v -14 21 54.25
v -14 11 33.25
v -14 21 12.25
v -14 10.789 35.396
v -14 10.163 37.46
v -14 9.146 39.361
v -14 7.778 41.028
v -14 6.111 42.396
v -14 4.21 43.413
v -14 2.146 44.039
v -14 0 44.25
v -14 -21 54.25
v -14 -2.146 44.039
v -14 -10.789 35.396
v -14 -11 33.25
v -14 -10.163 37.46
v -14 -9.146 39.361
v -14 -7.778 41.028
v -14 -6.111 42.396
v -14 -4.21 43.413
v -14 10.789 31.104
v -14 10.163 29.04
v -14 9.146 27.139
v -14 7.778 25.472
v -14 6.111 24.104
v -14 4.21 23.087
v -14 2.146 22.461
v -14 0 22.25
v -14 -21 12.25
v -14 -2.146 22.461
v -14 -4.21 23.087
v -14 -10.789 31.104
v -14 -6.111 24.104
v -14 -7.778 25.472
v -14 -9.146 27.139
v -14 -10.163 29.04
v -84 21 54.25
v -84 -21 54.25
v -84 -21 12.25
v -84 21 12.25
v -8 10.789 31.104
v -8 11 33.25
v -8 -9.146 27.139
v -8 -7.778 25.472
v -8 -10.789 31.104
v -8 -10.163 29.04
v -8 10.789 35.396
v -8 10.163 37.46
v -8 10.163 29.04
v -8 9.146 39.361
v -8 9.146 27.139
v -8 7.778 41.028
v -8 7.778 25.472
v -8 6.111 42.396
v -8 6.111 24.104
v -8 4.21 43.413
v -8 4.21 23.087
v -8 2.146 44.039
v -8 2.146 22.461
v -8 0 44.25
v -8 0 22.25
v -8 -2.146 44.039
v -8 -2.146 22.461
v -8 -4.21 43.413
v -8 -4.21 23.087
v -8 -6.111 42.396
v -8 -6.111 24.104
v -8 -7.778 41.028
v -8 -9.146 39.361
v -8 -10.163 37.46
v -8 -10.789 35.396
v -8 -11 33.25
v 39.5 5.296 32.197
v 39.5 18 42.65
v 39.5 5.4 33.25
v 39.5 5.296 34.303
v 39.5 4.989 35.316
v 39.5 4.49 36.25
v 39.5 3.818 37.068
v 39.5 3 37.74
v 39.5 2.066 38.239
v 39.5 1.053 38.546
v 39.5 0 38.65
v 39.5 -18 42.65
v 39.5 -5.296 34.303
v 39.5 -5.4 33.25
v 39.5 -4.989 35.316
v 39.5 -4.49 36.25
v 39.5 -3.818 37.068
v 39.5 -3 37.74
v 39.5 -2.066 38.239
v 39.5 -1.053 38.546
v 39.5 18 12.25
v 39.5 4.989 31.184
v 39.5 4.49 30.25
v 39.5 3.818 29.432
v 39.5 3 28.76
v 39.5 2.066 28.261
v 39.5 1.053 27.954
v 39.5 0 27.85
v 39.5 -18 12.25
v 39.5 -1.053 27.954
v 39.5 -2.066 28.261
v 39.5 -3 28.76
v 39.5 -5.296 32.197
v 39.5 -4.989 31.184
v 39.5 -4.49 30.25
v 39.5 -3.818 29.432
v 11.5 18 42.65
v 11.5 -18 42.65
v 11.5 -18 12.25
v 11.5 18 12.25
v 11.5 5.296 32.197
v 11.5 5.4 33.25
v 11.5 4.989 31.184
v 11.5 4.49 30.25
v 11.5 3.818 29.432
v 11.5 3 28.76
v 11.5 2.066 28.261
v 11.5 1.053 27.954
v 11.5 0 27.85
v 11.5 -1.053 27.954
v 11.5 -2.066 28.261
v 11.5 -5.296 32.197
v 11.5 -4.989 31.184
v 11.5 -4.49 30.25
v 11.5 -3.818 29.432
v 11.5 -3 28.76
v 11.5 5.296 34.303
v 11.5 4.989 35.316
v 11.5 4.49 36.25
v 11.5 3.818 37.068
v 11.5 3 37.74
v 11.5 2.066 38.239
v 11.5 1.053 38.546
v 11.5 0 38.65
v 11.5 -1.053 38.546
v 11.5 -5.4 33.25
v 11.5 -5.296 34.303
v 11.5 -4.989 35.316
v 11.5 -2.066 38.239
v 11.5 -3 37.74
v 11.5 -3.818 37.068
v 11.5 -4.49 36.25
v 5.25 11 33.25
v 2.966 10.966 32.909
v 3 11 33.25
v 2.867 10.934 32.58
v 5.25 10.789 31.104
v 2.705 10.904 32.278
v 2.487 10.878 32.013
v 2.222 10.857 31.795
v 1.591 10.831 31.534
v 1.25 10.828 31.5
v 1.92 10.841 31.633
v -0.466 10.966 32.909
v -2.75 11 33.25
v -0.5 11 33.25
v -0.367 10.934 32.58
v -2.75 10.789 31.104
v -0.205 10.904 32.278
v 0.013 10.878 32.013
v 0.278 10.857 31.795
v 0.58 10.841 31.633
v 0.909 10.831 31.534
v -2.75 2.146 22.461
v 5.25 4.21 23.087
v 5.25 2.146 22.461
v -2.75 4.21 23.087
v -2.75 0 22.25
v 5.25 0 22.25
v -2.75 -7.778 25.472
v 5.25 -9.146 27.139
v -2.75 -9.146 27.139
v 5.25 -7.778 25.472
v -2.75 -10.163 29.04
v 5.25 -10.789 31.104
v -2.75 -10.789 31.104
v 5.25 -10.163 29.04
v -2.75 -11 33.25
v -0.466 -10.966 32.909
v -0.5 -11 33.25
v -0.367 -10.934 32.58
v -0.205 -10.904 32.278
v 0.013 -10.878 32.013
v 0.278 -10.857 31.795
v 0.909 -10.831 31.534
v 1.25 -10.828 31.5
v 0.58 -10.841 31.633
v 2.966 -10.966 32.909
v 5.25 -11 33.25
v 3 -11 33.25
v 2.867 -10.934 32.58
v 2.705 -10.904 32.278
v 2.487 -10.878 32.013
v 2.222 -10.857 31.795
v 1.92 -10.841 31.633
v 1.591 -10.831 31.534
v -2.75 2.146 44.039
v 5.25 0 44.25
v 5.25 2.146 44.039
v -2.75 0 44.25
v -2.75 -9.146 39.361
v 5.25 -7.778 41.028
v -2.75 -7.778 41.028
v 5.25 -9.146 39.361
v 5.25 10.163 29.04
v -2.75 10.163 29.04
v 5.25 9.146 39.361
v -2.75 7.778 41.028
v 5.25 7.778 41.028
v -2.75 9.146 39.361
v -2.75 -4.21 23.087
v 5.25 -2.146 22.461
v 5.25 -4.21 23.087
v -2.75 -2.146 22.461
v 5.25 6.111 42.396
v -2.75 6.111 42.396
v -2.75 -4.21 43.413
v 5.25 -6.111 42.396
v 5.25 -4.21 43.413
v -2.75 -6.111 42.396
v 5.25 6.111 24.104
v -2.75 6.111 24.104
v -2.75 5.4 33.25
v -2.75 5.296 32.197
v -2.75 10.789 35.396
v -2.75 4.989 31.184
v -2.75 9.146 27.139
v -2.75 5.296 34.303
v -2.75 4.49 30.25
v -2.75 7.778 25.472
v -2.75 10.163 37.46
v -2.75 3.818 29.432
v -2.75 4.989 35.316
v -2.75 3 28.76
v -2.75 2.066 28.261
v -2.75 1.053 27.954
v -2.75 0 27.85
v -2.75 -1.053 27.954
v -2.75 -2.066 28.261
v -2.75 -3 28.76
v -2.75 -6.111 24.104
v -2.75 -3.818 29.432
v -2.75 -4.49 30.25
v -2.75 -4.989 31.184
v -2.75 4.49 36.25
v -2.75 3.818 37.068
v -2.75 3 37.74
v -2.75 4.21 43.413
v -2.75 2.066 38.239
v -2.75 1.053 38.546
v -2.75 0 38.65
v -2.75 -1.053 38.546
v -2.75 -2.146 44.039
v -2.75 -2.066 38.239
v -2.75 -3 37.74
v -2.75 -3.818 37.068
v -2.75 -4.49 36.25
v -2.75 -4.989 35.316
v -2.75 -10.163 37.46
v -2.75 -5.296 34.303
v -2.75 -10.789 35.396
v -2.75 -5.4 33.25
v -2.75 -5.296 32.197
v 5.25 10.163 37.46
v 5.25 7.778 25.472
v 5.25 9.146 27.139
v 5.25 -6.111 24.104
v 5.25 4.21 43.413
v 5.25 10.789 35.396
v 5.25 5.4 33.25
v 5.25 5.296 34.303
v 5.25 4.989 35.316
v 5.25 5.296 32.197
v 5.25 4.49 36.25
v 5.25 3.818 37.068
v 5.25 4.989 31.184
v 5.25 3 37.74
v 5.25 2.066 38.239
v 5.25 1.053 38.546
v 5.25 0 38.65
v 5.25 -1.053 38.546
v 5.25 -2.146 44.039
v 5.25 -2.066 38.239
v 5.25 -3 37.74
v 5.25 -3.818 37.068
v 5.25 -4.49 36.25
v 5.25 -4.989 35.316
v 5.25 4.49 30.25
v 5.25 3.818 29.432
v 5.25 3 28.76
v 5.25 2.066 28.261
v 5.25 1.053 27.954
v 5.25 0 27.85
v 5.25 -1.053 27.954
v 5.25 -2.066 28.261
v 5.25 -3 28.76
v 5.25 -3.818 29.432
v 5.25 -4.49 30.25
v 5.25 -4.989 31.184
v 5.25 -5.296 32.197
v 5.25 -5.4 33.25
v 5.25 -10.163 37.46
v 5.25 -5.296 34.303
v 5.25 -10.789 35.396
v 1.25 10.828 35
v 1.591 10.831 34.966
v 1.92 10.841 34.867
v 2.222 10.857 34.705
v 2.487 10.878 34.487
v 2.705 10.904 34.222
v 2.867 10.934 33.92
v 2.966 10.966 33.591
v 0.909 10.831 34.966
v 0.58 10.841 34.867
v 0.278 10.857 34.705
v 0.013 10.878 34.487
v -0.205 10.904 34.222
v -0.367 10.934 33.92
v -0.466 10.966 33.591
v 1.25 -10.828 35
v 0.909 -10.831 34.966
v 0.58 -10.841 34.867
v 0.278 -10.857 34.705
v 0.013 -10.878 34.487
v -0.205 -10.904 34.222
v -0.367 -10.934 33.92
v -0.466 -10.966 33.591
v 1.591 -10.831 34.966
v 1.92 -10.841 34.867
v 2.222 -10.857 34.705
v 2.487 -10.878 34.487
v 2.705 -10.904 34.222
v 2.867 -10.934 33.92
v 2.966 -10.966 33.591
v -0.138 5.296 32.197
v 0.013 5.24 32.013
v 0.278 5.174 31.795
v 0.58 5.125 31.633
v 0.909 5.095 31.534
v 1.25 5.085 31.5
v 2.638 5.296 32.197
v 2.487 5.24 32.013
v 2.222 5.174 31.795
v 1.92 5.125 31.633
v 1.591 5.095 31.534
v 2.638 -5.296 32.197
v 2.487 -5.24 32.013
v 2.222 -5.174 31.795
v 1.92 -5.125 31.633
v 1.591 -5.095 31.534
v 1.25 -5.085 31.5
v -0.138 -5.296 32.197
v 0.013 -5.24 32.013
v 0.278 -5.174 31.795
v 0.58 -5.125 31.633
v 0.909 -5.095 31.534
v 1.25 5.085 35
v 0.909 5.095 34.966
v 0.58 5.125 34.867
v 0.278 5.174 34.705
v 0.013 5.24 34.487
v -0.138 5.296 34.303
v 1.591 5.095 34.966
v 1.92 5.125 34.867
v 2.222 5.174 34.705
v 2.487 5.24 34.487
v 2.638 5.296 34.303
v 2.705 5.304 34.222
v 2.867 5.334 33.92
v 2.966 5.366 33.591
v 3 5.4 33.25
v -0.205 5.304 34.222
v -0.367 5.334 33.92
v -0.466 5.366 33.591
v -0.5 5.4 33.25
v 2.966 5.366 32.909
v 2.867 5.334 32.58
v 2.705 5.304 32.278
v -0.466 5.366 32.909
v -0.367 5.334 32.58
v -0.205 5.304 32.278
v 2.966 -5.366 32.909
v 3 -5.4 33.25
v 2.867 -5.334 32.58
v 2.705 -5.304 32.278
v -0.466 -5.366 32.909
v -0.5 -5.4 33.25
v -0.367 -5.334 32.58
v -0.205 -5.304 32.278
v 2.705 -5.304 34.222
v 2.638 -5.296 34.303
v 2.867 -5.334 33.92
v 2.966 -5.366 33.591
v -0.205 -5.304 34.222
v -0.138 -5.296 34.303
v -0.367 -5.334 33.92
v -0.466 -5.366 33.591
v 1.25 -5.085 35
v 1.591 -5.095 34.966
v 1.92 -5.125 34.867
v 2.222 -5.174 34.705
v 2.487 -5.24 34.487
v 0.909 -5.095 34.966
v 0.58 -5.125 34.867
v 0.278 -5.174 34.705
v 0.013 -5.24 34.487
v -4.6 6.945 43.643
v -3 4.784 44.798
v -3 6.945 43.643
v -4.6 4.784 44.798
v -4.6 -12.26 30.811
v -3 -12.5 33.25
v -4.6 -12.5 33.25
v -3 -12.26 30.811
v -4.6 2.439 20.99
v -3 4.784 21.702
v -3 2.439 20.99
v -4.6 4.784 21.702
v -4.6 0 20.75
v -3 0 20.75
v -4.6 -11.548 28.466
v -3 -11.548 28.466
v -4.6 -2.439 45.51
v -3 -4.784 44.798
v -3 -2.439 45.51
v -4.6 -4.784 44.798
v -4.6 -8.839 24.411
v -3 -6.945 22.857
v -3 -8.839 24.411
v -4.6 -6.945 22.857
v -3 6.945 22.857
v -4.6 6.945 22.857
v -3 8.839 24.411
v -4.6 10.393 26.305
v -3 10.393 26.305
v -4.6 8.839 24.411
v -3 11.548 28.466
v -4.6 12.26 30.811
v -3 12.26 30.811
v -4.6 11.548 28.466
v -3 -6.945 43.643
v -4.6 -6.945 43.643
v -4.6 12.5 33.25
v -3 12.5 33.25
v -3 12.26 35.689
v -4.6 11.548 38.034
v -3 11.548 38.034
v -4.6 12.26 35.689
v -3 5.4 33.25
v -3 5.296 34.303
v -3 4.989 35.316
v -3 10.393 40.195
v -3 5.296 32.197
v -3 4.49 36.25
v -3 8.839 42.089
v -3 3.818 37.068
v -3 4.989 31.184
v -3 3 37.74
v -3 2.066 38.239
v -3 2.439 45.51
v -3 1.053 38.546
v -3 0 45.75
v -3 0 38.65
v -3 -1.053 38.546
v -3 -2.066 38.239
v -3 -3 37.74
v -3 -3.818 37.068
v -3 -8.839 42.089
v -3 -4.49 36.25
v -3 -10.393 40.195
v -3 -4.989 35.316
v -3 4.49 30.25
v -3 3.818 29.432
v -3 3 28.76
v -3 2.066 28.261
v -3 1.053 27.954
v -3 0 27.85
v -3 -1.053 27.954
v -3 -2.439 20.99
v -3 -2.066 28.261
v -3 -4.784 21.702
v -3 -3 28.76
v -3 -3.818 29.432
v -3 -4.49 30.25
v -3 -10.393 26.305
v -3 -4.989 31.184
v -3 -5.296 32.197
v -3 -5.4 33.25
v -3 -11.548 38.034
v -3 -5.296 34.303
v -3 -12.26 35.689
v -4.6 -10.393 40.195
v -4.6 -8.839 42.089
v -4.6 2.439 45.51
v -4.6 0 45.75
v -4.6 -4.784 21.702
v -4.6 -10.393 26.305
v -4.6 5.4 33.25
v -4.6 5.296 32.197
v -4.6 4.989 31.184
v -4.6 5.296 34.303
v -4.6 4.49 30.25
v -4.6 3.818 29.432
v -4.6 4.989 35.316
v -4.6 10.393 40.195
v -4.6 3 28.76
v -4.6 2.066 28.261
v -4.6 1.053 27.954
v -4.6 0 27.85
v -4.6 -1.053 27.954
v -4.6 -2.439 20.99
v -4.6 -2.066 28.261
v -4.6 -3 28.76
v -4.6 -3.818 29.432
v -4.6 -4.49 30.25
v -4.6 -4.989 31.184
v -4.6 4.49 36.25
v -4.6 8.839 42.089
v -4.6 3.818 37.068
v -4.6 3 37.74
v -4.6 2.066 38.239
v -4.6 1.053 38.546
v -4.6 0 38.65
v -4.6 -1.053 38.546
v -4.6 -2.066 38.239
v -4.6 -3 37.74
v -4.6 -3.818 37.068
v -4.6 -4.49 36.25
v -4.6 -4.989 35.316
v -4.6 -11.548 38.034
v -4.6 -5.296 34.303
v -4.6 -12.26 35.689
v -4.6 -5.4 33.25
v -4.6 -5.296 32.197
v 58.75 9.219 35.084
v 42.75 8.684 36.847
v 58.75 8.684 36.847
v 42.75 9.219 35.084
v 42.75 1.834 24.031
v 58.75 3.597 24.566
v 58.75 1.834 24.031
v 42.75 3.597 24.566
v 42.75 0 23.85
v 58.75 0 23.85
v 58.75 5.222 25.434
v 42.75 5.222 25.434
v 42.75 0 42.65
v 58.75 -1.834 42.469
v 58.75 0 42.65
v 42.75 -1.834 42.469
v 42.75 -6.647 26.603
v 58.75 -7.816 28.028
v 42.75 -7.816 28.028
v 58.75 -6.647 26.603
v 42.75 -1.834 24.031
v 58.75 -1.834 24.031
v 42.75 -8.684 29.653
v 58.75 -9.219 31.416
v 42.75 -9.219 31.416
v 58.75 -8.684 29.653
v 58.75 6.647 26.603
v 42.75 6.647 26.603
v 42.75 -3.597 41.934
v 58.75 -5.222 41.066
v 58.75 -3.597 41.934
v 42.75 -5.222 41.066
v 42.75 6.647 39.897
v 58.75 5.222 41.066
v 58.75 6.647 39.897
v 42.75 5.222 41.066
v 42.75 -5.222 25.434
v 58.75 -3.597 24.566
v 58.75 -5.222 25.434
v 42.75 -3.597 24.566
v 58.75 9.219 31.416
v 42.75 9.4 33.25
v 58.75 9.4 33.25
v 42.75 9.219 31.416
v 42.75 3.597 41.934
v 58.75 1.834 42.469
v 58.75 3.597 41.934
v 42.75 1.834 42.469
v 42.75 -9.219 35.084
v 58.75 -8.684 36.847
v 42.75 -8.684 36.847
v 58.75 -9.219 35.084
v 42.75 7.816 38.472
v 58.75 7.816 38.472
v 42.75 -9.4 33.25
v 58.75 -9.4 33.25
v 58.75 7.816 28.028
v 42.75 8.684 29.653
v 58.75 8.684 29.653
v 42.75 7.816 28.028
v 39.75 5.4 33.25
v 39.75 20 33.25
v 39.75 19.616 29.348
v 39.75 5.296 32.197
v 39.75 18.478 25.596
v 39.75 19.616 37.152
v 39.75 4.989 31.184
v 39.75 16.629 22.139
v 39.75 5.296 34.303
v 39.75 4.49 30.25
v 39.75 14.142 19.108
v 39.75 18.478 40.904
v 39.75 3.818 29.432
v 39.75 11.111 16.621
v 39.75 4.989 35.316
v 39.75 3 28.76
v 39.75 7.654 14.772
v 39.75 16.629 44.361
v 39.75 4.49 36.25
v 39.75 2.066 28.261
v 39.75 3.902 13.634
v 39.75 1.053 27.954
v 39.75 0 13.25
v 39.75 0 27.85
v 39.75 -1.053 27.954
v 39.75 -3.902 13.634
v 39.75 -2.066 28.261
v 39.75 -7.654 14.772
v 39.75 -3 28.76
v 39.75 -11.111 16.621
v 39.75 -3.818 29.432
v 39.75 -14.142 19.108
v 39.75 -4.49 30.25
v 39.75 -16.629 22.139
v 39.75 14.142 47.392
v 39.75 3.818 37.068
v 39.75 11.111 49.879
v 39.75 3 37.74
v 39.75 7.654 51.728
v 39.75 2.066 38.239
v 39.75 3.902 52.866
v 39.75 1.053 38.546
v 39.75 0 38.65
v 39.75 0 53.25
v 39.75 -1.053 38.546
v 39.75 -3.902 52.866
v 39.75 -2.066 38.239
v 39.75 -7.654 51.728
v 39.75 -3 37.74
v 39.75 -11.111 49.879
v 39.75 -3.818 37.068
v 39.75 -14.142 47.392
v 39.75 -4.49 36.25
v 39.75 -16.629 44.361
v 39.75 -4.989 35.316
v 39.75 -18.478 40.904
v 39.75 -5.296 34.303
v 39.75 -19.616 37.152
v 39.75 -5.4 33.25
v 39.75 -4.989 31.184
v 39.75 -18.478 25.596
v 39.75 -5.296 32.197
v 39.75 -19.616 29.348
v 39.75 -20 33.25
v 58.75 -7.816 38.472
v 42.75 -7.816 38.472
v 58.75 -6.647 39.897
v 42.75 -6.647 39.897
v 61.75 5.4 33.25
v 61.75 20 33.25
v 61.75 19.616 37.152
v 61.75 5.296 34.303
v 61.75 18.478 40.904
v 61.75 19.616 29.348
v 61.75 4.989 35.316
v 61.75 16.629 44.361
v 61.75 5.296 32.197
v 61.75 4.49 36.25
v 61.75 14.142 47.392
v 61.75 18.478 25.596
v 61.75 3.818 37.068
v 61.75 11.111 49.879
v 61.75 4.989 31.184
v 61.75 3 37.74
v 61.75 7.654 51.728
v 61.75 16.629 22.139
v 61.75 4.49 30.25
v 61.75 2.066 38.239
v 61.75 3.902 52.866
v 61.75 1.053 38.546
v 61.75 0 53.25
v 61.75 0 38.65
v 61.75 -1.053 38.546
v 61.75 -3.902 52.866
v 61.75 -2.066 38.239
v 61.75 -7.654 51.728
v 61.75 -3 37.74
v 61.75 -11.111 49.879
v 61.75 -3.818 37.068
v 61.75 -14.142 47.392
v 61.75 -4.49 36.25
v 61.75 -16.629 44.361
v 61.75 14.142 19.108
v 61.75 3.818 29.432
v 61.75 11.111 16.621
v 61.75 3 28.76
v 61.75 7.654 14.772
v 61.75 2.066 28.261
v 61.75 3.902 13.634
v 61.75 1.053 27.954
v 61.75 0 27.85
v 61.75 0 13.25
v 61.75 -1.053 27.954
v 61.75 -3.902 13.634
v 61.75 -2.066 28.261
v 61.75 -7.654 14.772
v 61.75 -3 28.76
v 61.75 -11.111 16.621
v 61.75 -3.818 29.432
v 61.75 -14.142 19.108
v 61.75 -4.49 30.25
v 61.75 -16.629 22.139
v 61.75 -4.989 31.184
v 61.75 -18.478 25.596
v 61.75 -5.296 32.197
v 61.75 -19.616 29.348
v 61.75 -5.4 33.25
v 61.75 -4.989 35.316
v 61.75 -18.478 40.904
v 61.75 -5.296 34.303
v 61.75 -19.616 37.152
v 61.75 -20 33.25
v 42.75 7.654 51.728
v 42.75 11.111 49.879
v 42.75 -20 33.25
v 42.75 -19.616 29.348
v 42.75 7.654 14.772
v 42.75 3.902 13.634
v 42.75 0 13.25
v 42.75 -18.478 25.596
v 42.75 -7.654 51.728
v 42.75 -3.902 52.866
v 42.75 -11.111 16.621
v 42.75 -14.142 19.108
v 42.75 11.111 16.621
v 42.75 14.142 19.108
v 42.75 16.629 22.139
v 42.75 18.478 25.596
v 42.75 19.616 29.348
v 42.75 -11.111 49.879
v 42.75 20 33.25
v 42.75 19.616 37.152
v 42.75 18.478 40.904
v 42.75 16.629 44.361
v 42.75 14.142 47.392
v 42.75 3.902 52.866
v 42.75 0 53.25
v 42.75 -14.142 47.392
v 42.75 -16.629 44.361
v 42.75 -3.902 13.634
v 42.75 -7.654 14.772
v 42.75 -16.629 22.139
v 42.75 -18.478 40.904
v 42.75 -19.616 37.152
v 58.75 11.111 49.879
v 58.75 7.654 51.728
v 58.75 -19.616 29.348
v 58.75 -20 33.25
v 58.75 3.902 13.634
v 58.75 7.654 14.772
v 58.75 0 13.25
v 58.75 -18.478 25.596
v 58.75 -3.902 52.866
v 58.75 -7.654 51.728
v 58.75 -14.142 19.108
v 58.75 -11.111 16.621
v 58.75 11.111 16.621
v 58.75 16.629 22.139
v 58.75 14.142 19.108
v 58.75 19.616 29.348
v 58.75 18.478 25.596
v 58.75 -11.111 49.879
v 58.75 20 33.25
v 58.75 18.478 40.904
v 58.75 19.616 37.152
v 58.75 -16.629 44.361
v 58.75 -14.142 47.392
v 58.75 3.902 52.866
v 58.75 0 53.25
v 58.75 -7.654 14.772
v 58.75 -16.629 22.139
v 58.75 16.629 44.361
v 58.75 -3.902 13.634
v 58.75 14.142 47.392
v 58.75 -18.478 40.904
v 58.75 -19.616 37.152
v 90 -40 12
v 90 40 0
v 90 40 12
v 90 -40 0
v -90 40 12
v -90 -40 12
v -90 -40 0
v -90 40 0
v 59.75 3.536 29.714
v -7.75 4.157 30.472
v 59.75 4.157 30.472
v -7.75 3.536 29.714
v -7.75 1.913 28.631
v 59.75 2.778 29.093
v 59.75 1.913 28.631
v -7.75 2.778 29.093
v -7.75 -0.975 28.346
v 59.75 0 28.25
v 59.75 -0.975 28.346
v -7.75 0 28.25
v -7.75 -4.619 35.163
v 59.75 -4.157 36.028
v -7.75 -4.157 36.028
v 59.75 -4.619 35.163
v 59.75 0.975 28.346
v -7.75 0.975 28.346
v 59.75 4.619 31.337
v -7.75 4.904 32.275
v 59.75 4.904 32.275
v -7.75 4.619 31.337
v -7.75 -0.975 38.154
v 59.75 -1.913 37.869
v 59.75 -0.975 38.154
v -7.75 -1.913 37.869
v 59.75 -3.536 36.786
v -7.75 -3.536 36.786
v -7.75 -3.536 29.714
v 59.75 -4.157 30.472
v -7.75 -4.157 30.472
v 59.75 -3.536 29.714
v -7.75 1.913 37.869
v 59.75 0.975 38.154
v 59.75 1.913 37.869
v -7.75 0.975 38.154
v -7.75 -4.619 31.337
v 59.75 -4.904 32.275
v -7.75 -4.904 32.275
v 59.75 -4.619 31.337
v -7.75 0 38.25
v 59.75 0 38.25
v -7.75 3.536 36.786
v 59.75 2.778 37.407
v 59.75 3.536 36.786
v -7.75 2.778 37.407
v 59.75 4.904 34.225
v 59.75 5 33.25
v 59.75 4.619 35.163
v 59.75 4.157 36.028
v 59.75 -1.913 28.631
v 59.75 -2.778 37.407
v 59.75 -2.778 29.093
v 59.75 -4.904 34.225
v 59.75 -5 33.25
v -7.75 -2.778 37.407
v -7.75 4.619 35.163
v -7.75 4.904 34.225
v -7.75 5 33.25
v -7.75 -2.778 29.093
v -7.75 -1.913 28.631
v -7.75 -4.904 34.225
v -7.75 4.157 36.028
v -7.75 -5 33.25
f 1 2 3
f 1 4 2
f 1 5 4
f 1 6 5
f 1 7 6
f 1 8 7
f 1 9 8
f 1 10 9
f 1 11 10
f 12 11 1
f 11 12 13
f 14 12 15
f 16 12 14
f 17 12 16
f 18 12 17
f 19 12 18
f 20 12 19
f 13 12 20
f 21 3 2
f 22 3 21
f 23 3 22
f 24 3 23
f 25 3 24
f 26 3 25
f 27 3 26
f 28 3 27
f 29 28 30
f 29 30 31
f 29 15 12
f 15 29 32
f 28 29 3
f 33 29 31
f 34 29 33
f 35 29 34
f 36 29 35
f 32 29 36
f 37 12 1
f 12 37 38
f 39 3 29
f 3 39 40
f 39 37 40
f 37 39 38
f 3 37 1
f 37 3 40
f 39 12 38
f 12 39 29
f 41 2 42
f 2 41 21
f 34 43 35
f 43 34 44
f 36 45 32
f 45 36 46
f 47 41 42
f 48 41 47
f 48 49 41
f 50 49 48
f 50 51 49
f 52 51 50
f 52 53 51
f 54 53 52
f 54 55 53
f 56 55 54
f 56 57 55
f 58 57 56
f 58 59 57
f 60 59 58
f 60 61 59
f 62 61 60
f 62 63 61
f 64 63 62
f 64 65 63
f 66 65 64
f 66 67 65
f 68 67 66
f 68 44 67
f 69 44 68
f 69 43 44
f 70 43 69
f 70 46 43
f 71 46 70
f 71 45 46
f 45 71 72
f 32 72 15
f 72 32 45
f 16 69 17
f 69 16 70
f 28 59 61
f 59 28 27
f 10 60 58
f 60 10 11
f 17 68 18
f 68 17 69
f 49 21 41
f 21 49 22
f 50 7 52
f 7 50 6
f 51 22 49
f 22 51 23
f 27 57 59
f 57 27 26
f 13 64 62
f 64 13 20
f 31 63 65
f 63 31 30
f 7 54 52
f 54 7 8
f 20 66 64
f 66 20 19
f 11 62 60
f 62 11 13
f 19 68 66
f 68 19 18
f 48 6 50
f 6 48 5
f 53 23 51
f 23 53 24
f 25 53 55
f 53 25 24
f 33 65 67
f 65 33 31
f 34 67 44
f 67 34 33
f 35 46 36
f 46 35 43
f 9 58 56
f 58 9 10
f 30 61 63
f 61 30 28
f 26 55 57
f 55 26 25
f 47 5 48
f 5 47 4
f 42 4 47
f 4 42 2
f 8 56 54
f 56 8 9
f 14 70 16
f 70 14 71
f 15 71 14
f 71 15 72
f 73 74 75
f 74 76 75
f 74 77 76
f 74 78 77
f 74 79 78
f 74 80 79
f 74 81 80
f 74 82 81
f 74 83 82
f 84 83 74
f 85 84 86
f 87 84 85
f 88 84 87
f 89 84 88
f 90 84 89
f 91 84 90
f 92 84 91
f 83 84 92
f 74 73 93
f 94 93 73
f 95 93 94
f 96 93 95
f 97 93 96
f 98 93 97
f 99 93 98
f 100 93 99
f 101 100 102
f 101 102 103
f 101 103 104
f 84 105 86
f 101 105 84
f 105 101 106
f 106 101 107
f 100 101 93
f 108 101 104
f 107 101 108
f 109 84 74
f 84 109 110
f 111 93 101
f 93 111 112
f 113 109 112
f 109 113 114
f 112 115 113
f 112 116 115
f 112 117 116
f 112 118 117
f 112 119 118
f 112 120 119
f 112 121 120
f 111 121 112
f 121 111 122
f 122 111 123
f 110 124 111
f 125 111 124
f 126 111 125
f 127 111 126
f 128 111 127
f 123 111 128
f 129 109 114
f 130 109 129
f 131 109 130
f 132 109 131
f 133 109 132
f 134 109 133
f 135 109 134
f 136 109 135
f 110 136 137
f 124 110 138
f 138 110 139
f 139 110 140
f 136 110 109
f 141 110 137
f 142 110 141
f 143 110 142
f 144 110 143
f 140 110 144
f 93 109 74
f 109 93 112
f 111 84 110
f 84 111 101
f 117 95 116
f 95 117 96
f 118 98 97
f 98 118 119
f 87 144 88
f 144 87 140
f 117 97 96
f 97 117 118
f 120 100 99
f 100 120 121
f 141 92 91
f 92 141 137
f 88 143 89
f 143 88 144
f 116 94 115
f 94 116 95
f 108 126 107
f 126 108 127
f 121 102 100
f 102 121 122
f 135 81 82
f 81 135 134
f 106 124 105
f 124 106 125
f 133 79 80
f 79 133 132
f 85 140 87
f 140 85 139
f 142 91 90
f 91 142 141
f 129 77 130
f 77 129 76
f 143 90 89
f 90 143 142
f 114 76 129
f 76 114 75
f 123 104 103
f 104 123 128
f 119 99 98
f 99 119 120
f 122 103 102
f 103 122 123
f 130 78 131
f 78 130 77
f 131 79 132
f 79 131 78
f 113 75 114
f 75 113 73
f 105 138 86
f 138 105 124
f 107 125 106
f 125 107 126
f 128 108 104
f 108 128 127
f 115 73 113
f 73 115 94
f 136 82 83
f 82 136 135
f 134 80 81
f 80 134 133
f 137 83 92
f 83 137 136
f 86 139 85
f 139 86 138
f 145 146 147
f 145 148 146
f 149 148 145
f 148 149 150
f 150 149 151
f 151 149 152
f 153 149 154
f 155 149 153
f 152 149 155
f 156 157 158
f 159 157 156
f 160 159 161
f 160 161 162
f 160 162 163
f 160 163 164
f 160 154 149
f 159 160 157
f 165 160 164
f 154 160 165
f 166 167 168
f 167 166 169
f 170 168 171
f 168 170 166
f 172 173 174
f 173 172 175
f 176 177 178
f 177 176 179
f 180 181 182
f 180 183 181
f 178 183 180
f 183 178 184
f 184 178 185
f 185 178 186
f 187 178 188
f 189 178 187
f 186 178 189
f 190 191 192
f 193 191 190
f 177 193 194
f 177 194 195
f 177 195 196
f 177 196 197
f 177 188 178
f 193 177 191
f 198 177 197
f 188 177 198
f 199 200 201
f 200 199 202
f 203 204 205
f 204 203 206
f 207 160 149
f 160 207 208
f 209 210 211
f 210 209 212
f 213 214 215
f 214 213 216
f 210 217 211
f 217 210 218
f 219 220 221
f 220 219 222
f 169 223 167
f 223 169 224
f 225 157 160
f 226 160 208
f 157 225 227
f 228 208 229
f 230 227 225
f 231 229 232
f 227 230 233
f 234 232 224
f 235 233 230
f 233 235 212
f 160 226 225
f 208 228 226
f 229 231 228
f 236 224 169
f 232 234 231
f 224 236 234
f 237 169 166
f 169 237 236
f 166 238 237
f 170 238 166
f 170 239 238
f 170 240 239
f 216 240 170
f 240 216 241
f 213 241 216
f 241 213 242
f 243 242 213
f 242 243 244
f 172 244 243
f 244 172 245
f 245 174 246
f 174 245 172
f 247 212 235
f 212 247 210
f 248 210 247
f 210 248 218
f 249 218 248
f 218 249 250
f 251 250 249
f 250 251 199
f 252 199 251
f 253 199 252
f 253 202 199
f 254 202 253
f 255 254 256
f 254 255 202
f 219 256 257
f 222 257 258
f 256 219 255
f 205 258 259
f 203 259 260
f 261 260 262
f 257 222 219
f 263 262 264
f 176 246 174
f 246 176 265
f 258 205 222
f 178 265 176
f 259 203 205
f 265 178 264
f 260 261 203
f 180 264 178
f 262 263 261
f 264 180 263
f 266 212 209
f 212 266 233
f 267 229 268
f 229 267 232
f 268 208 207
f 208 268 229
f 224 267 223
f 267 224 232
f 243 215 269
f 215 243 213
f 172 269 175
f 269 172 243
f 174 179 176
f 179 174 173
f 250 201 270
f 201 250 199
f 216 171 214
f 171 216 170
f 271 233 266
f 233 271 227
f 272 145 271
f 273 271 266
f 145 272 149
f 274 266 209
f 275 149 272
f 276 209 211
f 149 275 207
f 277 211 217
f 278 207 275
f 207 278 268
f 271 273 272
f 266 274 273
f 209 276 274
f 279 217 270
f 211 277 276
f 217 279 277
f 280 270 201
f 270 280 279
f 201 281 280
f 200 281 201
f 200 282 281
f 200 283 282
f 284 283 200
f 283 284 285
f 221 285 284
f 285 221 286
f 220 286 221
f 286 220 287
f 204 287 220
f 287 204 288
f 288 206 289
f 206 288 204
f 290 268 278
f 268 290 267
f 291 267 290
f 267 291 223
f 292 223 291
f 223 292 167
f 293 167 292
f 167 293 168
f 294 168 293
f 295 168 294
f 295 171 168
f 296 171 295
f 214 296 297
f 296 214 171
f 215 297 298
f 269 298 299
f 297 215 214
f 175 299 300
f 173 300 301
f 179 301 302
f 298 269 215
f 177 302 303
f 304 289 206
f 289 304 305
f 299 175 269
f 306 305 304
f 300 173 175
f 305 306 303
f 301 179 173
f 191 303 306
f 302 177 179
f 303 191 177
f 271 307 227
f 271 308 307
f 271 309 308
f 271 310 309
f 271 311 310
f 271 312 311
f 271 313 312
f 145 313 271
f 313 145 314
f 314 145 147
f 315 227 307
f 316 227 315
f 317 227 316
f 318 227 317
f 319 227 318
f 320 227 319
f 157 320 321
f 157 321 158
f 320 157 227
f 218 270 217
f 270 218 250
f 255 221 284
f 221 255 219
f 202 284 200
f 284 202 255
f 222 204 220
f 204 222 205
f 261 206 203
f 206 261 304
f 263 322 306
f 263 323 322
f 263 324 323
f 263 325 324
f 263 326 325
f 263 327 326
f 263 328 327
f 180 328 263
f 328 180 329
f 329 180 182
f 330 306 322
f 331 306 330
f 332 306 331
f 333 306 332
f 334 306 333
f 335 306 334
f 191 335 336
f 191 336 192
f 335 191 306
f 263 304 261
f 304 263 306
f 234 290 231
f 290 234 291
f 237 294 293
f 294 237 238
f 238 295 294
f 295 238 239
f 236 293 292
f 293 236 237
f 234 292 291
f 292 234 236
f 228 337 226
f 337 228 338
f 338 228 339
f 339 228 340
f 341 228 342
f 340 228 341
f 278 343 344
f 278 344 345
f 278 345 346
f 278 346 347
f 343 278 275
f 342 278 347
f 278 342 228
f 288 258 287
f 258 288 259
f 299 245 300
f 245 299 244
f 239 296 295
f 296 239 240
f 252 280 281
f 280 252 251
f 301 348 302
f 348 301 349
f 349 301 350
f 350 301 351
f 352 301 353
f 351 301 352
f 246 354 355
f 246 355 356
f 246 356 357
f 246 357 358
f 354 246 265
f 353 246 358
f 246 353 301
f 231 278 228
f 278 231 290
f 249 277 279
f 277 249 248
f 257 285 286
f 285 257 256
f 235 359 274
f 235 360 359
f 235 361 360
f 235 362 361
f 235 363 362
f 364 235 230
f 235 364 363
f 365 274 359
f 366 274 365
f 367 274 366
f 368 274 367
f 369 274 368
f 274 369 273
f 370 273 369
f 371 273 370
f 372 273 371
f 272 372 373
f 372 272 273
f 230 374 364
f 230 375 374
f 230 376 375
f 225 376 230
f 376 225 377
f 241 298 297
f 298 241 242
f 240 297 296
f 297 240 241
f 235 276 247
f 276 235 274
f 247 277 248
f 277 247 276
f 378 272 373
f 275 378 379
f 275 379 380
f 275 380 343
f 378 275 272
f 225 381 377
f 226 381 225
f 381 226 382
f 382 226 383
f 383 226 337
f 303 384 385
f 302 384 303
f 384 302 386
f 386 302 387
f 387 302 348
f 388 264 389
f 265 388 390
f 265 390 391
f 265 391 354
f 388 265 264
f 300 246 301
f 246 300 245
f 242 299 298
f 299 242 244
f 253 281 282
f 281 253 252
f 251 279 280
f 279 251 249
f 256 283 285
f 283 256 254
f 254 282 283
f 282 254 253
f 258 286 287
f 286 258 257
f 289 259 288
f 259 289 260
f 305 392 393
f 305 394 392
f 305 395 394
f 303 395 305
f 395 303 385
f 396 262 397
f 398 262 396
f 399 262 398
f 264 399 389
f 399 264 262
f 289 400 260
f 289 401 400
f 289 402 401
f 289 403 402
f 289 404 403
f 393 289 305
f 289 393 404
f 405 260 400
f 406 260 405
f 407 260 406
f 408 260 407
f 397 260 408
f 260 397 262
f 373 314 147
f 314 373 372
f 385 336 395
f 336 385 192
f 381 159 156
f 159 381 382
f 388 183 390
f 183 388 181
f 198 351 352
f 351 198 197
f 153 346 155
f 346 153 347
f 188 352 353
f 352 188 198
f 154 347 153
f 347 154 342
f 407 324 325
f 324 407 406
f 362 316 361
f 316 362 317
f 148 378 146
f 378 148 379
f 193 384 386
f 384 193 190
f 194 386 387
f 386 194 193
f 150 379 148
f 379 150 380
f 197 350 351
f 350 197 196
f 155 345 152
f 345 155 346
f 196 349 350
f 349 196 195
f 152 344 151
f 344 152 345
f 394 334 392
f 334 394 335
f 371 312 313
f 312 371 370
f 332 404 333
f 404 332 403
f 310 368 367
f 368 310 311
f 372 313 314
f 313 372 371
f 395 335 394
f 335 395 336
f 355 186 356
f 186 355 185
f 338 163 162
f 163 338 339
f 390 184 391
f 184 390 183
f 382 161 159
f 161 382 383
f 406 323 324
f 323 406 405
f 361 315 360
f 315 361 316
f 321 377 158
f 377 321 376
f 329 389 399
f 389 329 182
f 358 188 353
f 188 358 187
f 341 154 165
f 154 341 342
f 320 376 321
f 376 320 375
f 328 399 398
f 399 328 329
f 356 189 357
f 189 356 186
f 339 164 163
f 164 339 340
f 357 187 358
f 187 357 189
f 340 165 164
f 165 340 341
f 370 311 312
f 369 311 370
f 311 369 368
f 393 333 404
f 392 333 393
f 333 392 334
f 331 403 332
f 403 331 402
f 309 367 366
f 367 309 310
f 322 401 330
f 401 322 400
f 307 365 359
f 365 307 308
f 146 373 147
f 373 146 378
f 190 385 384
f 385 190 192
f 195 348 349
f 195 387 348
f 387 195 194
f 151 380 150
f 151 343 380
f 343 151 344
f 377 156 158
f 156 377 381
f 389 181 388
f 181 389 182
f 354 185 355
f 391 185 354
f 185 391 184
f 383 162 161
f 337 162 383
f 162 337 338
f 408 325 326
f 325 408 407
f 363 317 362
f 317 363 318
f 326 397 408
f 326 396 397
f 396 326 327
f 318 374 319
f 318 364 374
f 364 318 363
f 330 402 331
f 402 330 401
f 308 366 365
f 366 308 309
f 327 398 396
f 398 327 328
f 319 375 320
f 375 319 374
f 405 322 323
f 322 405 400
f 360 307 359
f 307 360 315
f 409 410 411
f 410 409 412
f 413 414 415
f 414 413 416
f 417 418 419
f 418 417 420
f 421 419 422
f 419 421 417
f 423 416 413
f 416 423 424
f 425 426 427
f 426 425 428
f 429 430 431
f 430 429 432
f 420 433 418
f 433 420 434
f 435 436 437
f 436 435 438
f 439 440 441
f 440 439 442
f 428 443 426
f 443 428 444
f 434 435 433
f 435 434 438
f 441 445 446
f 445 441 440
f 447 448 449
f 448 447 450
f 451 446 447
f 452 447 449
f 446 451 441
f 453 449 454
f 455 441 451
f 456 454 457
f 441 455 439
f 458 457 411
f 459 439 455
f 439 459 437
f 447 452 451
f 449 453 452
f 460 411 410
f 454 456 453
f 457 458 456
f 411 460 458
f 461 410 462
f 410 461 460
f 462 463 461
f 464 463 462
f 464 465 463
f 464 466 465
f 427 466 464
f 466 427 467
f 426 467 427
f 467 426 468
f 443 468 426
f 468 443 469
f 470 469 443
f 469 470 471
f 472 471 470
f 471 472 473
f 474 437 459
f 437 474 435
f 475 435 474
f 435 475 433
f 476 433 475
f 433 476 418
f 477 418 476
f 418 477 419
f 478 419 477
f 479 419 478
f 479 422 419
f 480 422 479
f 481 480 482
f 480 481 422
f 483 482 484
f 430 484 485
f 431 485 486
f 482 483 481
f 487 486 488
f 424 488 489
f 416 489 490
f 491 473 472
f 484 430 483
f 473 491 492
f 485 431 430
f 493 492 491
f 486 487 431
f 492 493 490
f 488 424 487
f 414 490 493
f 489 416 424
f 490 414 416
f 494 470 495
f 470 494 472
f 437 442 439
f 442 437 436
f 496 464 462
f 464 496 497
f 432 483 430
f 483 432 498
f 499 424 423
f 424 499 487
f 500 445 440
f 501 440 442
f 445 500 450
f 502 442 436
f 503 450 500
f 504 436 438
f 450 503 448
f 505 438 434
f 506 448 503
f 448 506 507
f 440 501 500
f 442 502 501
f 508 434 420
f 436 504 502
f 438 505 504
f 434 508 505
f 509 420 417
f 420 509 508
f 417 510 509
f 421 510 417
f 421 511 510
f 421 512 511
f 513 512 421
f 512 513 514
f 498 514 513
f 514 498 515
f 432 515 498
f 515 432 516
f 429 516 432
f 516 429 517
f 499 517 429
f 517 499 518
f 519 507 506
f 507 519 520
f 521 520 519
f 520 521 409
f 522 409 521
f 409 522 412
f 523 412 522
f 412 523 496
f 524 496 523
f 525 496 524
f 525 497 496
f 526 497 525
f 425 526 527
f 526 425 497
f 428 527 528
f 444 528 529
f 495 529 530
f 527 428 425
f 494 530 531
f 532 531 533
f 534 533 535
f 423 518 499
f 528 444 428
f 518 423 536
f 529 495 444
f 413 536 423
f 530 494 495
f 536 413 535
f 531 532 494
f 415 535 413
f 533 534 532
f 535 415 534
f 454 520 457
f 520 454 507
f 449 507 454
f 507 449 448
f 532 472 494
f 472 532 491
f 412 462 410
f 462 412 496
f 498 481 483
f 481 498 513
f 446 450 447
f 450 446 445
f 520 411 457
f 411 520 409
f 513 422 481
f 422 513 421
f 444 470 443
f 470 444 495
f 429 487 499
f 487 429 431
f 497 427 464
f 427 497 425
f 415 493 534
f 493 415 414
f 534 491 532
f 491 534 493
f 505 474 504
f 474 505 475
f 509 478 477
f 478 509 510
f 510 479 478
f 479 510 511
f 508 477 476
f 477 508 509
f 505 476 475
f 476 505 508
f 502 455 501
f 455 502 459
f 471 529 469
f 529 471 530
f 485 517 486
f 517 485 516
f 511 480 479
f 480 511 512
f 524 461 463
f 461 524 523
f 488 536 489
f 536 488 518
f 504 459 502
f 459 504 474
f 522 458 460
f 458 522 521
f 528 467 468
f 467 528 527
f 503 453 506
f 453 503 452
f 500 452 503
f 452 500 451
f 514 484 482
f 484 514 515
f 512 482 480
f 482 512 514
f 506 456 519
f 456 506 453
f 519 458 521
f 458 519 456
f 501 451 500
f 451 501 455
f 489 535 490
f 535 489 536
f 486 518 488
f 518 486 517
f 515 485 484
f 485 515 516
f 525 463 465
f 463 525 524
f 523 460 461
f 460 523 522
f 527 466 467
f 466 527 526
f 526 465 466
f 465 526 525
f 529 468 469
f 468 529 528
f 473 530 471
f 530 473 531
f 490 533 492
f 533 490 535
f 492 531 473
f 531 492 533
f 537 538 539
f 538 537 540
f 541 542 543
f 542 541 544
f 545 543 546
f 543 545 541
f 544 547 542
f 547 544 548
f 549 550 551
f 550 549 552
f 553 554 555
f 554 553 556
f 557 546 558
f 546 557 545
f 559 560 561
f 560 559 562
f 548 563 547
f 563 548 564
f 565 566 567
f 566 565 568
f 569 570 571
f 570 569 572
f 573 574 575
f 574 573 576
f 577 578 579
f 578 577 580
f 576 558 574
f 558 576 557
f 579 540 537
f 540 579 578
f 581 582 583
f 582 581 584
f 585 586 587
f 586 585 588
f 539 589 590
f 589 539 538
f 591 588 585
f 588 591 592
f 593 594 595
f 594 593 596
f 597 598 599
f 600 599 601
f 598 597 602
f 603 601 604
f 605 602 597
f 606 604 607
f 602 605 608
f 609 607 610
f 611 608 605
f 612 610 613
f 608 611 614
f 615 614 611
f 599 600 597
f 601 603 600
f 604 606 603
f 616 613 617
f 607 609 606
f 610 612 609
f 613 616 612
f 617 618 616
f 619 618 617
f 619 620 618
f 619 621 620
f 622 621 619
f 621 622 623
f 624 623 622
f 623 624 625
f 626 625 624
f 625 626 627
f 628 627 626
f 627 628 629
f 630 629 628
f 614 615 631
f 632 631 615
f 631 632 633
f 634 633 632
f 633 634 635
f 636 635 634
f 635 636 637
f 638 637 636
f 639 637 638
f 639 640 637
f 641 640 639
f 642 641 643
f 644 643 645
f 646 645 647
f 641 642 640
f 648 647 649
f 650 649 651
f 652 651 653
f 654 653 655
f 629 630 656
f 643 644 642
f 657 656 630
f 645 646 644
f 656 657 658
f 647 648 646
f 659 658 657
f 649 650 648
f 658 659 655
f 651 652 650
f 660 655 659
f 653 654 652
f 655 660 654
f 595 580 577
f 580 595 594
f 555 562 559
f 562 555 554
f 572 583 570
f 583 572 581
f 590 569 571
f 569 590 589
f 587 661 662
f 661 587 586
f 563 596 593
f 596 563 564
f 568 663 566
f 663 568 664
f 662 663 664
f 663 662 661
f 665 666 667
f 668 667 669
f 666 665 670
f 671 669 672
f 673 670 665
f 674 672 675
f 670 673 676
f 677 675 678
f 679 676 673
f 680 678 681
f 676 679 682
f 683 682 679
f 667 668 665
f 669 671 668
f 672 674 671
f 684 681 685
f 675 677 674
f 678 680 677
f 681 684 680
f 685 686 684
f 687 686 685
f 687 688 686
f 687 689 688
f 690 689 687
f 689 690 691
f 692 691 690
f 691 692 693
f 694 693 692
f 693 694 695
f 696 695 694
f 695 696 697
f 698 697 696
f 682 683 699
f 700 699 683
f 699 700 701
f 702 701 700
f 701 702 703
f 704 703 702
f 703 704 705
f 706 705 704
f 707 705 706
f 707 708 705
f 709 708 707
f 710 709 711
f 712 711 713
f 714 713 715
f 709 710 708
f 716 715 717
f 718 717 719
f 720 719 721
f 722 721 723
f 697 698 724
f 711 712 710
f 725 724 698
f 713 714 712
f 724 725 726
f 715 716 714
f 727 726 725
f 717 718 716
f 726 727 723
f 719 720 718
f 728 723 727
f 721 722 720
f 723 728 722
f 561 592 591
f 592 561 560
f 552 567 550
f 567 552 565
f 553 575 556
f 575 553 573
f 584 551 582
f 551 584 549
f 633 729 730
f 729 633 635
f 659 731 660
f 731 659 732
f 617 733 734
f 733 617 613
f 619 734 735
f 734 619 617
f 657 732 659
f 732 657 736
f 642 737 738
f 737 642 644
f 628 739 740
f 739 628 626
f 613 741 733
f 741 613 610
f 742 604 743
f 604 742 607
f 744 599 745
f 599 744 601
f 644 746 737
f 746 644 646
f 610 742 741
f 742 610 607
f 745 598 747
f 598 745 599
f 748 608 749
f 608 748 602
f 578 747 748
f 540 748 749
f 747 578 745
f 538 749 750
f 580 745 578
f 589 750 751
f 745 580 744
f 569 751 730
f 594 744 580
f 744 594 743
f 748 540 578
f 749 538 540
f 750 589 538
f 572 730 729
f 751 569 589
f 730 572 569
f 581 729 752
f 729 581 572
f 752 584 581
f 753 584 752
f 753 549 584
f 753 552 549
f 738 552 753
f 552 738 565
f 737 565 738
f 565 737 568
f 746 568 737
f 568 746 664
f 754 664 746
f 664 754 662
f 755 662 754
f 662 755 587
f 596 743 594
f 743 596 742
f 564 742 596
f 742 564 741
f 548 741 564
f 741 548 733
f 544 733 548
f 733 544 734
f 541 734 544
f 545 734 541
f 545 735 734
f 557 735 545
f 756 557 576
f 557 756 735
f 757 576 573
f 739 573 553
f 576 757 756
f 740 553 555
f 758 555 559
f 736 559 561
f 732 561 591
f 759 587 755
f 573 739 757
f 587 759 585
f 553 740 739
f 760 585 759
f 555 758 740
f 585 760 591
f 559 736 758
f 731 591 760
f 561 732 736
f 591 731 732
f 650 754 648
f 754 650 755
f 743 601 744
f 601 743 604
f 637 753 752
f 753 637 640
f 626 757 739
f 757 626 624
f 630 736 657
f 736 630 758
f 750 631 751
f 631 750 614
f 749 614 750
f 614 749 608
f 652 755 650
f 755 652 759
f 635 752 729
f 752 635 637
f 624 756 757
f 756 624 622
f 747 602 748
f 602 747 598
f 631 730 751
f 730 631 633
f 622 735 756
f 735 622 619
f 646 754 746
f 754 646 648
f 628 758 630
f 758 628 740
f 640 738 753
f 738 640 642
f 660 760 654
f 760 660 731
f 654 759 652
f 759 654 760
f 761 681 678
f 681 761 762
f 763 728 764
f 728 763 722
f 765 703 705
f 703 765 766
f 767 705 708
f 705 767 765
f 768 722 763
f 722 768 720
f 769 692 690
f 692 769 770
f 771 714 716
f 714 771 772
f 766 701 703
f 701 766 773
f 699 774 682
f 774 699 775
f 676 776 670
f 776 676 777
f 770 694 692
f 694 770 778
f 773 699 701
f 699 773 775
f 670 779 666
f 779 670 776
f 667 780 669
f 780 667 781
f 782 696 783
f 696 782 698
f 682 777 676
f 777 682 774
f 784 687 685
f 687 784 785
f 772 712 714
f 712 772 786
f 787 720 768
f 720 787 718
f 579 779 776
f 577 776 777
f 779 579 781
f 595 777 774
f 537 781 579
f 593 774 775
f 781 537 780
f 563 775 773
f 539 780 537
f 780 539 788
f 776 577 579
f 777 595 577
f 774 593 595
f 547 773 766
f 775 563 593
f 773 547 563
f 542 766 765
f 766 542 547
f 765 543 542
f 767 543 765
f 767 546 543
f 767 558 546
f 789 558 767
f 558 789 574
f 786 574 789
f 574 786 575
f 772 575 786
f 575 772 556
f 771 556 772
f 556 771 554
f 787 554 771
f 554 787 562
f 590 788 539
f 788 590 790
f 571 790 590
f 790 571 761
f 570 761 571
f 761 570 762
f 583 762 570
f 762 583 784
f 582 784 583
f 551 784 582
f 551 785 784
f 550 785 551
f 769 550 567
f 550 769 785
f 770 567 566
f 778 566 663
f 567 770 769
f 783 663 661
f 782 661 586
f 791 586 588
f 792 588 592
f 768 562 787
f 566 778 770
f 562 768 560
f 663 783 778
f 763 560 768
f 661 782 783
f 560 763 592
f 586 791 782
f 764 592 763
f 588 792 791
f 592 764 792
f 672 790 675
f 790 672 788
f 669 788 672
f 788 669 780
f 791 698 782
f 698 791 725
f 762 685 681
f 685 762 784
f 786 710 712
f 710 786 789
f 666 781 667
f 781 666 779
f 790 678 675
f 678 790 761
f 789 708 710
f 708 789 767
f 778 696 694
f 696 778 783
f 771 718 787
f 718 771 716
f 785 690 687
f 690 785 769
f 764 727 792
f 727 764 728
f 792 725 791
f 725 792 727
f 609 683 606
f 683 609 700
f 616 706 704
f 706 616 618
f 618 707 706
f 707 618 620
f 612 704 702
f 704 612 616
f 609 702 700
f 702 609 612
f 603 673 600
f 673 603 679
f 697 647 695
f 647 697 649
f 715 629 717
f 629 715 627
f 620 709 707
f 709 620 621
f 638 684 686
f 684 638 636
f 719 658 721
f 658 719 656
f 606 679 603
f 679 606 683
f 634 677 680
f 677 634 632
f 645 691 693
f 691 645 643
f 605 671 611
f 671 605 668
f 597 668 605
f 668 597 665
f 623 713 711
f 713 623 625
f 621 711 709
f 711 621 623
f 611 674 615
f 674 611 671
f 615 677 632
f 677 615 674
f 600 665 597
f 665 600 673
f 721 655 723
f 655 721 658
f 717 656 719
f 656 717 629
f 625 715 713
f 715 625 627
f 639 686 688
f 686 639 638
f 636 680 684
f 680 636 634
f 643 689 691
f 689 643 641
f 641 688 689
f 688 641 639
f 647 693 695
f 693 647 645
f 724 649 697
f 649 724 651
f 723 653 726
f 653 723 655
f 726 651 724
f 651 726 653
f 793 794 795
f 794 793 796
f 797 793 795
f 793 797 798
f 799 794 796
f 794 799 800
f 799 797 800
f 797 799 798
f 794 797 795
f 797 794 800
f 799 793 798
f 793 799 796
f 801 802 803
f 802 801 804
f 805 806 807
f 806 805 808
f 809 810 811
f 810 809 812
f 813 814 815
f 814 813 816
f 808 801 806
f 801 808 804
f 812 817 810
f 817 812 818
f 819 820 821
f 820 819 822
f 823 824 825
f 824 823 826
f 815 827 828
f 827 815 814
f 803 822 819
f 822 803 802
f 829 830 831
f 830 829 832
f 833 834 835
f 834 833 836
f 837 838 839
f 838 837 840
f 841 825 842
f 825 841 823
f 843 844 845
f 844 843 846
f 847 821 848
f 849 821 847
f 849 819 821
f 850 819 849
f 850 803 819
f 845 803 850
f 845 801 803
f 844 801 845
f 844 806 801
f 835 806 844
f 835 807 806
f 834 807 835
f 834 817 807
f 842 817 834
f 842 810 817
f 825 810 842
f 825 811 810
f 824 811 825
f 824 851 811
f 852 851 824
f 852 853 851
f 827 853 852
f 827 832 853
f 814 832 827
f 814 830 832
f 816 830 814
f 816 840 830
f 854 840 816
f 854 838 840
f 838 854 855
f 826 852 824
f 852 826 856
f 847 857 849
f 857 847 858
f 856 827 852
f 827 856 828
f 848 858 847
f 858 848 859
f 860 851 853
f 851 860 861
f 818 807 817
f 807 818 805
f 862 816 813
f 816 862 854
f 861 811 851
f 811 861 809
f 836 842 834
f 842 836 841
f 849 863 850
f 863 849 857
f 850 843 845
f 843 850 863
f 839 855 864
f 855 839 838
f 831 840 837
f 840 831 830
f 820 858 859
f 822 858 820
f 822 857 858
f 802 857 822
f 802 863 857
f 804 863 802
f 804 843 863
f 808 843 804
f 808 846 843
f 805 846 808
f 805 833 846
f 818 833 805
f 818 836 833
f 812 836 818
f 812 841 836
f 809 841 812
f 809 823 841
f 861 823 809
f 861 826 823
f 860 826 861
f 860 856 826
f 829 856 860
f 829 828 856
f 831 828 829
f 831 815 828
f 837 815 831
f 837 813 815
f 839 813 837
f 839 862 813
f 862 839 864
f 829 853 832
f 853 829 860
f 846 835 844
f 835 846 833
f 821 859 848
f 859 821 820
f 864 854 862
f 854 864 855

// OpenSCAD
$fn = 32;

// ------------------------------------------------------------------------
// Motor drive station: motor 70 x 42 mm, shaft d10, pulley d40
// Every part is its own module, assembly() places every instance.
// ------------------------------------------------------------------------

// --- part 1 ---
module station_bed() {
  difference() {
    translate([-90, -40, 0]) cube([180, 80, 12]);
  }
}

// --- part 2 ---
module drive_motor() {
  union() {
    translate([-35, -21, 0]) cube([70, 42, 42]);
    translate([38, 0, 21]) rotate([0, 90, 0]) cylinder(h = 6, d = 22, center = true);
  }
}

// --- part 3 ---
module pillow_block() {
  difference() {
    translate([-14, -18, 0]) cube([28, 36, 30.4]);
    translate([0, 0, 21]) rotate([0, 90, 0]) cylinder(h = 30, d = 10.8, center = true);
  }
}

// --- part 4 ---
module drive_shaft() {
  translate([0, 0, -33.75]) cylinder(h = 67.5, d = 10);
}

// --- part 5 ---
module shaft_collar() {
  difference() {
    cylinder(h = 8, d = 22);
    translate([0, 0, -1]) cylinder(h = 10, d = 10.8);
    translate([0, 0, 4]) rotate([90, 0, 0]) cylinder(h = 24, d = 3.5, center = true);
  }
}

// --- part 6 ---
module collar_washer() {
  difference() {
      translate([0, 0, 0]) cylinder(h = 1.6, d = 25);
      translate([0, 0, -1]) cylinder(h = 3.6, d = 10.8);
    }
}

// --- part 7 ---
module drive_pulley() {
  difference() {
    union() {
      cylinder(h = 22, d = 18.8);
      cylinder(h = 3, d = 40);
      translate([0, 0, 19]) cylinder(h = 3, d = 40);
    }
    translate([0, 0, -1]) cylinder(h = 24, d = 10.8);
  }
}

// --- assembly ---
module assembly() {
  color([0.80, 0.24, 0.20]) translate([0, 0, 0]) rotate([0, 0, 0]) station_bed();
  color([0.20, 0.45, 0.75]) translate([-49, 0, 12.25]) rotate([0, 0, 0]) drive_motor();
  color([0.25, 0.62, 0.32]) translate([25.5, 0, 12.25]) rotate([0, 0, 0]) pillow_block();
  color([0.92, 0.70, 0.18]) translate([26, 0, 33.25]) rotate([0, 90, 0]) drive_shaft();
  color([0.58, 0.35, 0.70]) translate([-2.75, 0, 33.25]) rotate([0, 90, 0]) shaft_collar();
  color([0.16, 0.66, 0.66]) translate([-4.6, 0, 33.25]) rotate([0, 90, 0]) collar_washer();
  color([0.85, 0.48, 0.18]) translate([39.75, 0, 33.25]) rotate([0, 90, 0]) drive_pulley();
}

assembly();
